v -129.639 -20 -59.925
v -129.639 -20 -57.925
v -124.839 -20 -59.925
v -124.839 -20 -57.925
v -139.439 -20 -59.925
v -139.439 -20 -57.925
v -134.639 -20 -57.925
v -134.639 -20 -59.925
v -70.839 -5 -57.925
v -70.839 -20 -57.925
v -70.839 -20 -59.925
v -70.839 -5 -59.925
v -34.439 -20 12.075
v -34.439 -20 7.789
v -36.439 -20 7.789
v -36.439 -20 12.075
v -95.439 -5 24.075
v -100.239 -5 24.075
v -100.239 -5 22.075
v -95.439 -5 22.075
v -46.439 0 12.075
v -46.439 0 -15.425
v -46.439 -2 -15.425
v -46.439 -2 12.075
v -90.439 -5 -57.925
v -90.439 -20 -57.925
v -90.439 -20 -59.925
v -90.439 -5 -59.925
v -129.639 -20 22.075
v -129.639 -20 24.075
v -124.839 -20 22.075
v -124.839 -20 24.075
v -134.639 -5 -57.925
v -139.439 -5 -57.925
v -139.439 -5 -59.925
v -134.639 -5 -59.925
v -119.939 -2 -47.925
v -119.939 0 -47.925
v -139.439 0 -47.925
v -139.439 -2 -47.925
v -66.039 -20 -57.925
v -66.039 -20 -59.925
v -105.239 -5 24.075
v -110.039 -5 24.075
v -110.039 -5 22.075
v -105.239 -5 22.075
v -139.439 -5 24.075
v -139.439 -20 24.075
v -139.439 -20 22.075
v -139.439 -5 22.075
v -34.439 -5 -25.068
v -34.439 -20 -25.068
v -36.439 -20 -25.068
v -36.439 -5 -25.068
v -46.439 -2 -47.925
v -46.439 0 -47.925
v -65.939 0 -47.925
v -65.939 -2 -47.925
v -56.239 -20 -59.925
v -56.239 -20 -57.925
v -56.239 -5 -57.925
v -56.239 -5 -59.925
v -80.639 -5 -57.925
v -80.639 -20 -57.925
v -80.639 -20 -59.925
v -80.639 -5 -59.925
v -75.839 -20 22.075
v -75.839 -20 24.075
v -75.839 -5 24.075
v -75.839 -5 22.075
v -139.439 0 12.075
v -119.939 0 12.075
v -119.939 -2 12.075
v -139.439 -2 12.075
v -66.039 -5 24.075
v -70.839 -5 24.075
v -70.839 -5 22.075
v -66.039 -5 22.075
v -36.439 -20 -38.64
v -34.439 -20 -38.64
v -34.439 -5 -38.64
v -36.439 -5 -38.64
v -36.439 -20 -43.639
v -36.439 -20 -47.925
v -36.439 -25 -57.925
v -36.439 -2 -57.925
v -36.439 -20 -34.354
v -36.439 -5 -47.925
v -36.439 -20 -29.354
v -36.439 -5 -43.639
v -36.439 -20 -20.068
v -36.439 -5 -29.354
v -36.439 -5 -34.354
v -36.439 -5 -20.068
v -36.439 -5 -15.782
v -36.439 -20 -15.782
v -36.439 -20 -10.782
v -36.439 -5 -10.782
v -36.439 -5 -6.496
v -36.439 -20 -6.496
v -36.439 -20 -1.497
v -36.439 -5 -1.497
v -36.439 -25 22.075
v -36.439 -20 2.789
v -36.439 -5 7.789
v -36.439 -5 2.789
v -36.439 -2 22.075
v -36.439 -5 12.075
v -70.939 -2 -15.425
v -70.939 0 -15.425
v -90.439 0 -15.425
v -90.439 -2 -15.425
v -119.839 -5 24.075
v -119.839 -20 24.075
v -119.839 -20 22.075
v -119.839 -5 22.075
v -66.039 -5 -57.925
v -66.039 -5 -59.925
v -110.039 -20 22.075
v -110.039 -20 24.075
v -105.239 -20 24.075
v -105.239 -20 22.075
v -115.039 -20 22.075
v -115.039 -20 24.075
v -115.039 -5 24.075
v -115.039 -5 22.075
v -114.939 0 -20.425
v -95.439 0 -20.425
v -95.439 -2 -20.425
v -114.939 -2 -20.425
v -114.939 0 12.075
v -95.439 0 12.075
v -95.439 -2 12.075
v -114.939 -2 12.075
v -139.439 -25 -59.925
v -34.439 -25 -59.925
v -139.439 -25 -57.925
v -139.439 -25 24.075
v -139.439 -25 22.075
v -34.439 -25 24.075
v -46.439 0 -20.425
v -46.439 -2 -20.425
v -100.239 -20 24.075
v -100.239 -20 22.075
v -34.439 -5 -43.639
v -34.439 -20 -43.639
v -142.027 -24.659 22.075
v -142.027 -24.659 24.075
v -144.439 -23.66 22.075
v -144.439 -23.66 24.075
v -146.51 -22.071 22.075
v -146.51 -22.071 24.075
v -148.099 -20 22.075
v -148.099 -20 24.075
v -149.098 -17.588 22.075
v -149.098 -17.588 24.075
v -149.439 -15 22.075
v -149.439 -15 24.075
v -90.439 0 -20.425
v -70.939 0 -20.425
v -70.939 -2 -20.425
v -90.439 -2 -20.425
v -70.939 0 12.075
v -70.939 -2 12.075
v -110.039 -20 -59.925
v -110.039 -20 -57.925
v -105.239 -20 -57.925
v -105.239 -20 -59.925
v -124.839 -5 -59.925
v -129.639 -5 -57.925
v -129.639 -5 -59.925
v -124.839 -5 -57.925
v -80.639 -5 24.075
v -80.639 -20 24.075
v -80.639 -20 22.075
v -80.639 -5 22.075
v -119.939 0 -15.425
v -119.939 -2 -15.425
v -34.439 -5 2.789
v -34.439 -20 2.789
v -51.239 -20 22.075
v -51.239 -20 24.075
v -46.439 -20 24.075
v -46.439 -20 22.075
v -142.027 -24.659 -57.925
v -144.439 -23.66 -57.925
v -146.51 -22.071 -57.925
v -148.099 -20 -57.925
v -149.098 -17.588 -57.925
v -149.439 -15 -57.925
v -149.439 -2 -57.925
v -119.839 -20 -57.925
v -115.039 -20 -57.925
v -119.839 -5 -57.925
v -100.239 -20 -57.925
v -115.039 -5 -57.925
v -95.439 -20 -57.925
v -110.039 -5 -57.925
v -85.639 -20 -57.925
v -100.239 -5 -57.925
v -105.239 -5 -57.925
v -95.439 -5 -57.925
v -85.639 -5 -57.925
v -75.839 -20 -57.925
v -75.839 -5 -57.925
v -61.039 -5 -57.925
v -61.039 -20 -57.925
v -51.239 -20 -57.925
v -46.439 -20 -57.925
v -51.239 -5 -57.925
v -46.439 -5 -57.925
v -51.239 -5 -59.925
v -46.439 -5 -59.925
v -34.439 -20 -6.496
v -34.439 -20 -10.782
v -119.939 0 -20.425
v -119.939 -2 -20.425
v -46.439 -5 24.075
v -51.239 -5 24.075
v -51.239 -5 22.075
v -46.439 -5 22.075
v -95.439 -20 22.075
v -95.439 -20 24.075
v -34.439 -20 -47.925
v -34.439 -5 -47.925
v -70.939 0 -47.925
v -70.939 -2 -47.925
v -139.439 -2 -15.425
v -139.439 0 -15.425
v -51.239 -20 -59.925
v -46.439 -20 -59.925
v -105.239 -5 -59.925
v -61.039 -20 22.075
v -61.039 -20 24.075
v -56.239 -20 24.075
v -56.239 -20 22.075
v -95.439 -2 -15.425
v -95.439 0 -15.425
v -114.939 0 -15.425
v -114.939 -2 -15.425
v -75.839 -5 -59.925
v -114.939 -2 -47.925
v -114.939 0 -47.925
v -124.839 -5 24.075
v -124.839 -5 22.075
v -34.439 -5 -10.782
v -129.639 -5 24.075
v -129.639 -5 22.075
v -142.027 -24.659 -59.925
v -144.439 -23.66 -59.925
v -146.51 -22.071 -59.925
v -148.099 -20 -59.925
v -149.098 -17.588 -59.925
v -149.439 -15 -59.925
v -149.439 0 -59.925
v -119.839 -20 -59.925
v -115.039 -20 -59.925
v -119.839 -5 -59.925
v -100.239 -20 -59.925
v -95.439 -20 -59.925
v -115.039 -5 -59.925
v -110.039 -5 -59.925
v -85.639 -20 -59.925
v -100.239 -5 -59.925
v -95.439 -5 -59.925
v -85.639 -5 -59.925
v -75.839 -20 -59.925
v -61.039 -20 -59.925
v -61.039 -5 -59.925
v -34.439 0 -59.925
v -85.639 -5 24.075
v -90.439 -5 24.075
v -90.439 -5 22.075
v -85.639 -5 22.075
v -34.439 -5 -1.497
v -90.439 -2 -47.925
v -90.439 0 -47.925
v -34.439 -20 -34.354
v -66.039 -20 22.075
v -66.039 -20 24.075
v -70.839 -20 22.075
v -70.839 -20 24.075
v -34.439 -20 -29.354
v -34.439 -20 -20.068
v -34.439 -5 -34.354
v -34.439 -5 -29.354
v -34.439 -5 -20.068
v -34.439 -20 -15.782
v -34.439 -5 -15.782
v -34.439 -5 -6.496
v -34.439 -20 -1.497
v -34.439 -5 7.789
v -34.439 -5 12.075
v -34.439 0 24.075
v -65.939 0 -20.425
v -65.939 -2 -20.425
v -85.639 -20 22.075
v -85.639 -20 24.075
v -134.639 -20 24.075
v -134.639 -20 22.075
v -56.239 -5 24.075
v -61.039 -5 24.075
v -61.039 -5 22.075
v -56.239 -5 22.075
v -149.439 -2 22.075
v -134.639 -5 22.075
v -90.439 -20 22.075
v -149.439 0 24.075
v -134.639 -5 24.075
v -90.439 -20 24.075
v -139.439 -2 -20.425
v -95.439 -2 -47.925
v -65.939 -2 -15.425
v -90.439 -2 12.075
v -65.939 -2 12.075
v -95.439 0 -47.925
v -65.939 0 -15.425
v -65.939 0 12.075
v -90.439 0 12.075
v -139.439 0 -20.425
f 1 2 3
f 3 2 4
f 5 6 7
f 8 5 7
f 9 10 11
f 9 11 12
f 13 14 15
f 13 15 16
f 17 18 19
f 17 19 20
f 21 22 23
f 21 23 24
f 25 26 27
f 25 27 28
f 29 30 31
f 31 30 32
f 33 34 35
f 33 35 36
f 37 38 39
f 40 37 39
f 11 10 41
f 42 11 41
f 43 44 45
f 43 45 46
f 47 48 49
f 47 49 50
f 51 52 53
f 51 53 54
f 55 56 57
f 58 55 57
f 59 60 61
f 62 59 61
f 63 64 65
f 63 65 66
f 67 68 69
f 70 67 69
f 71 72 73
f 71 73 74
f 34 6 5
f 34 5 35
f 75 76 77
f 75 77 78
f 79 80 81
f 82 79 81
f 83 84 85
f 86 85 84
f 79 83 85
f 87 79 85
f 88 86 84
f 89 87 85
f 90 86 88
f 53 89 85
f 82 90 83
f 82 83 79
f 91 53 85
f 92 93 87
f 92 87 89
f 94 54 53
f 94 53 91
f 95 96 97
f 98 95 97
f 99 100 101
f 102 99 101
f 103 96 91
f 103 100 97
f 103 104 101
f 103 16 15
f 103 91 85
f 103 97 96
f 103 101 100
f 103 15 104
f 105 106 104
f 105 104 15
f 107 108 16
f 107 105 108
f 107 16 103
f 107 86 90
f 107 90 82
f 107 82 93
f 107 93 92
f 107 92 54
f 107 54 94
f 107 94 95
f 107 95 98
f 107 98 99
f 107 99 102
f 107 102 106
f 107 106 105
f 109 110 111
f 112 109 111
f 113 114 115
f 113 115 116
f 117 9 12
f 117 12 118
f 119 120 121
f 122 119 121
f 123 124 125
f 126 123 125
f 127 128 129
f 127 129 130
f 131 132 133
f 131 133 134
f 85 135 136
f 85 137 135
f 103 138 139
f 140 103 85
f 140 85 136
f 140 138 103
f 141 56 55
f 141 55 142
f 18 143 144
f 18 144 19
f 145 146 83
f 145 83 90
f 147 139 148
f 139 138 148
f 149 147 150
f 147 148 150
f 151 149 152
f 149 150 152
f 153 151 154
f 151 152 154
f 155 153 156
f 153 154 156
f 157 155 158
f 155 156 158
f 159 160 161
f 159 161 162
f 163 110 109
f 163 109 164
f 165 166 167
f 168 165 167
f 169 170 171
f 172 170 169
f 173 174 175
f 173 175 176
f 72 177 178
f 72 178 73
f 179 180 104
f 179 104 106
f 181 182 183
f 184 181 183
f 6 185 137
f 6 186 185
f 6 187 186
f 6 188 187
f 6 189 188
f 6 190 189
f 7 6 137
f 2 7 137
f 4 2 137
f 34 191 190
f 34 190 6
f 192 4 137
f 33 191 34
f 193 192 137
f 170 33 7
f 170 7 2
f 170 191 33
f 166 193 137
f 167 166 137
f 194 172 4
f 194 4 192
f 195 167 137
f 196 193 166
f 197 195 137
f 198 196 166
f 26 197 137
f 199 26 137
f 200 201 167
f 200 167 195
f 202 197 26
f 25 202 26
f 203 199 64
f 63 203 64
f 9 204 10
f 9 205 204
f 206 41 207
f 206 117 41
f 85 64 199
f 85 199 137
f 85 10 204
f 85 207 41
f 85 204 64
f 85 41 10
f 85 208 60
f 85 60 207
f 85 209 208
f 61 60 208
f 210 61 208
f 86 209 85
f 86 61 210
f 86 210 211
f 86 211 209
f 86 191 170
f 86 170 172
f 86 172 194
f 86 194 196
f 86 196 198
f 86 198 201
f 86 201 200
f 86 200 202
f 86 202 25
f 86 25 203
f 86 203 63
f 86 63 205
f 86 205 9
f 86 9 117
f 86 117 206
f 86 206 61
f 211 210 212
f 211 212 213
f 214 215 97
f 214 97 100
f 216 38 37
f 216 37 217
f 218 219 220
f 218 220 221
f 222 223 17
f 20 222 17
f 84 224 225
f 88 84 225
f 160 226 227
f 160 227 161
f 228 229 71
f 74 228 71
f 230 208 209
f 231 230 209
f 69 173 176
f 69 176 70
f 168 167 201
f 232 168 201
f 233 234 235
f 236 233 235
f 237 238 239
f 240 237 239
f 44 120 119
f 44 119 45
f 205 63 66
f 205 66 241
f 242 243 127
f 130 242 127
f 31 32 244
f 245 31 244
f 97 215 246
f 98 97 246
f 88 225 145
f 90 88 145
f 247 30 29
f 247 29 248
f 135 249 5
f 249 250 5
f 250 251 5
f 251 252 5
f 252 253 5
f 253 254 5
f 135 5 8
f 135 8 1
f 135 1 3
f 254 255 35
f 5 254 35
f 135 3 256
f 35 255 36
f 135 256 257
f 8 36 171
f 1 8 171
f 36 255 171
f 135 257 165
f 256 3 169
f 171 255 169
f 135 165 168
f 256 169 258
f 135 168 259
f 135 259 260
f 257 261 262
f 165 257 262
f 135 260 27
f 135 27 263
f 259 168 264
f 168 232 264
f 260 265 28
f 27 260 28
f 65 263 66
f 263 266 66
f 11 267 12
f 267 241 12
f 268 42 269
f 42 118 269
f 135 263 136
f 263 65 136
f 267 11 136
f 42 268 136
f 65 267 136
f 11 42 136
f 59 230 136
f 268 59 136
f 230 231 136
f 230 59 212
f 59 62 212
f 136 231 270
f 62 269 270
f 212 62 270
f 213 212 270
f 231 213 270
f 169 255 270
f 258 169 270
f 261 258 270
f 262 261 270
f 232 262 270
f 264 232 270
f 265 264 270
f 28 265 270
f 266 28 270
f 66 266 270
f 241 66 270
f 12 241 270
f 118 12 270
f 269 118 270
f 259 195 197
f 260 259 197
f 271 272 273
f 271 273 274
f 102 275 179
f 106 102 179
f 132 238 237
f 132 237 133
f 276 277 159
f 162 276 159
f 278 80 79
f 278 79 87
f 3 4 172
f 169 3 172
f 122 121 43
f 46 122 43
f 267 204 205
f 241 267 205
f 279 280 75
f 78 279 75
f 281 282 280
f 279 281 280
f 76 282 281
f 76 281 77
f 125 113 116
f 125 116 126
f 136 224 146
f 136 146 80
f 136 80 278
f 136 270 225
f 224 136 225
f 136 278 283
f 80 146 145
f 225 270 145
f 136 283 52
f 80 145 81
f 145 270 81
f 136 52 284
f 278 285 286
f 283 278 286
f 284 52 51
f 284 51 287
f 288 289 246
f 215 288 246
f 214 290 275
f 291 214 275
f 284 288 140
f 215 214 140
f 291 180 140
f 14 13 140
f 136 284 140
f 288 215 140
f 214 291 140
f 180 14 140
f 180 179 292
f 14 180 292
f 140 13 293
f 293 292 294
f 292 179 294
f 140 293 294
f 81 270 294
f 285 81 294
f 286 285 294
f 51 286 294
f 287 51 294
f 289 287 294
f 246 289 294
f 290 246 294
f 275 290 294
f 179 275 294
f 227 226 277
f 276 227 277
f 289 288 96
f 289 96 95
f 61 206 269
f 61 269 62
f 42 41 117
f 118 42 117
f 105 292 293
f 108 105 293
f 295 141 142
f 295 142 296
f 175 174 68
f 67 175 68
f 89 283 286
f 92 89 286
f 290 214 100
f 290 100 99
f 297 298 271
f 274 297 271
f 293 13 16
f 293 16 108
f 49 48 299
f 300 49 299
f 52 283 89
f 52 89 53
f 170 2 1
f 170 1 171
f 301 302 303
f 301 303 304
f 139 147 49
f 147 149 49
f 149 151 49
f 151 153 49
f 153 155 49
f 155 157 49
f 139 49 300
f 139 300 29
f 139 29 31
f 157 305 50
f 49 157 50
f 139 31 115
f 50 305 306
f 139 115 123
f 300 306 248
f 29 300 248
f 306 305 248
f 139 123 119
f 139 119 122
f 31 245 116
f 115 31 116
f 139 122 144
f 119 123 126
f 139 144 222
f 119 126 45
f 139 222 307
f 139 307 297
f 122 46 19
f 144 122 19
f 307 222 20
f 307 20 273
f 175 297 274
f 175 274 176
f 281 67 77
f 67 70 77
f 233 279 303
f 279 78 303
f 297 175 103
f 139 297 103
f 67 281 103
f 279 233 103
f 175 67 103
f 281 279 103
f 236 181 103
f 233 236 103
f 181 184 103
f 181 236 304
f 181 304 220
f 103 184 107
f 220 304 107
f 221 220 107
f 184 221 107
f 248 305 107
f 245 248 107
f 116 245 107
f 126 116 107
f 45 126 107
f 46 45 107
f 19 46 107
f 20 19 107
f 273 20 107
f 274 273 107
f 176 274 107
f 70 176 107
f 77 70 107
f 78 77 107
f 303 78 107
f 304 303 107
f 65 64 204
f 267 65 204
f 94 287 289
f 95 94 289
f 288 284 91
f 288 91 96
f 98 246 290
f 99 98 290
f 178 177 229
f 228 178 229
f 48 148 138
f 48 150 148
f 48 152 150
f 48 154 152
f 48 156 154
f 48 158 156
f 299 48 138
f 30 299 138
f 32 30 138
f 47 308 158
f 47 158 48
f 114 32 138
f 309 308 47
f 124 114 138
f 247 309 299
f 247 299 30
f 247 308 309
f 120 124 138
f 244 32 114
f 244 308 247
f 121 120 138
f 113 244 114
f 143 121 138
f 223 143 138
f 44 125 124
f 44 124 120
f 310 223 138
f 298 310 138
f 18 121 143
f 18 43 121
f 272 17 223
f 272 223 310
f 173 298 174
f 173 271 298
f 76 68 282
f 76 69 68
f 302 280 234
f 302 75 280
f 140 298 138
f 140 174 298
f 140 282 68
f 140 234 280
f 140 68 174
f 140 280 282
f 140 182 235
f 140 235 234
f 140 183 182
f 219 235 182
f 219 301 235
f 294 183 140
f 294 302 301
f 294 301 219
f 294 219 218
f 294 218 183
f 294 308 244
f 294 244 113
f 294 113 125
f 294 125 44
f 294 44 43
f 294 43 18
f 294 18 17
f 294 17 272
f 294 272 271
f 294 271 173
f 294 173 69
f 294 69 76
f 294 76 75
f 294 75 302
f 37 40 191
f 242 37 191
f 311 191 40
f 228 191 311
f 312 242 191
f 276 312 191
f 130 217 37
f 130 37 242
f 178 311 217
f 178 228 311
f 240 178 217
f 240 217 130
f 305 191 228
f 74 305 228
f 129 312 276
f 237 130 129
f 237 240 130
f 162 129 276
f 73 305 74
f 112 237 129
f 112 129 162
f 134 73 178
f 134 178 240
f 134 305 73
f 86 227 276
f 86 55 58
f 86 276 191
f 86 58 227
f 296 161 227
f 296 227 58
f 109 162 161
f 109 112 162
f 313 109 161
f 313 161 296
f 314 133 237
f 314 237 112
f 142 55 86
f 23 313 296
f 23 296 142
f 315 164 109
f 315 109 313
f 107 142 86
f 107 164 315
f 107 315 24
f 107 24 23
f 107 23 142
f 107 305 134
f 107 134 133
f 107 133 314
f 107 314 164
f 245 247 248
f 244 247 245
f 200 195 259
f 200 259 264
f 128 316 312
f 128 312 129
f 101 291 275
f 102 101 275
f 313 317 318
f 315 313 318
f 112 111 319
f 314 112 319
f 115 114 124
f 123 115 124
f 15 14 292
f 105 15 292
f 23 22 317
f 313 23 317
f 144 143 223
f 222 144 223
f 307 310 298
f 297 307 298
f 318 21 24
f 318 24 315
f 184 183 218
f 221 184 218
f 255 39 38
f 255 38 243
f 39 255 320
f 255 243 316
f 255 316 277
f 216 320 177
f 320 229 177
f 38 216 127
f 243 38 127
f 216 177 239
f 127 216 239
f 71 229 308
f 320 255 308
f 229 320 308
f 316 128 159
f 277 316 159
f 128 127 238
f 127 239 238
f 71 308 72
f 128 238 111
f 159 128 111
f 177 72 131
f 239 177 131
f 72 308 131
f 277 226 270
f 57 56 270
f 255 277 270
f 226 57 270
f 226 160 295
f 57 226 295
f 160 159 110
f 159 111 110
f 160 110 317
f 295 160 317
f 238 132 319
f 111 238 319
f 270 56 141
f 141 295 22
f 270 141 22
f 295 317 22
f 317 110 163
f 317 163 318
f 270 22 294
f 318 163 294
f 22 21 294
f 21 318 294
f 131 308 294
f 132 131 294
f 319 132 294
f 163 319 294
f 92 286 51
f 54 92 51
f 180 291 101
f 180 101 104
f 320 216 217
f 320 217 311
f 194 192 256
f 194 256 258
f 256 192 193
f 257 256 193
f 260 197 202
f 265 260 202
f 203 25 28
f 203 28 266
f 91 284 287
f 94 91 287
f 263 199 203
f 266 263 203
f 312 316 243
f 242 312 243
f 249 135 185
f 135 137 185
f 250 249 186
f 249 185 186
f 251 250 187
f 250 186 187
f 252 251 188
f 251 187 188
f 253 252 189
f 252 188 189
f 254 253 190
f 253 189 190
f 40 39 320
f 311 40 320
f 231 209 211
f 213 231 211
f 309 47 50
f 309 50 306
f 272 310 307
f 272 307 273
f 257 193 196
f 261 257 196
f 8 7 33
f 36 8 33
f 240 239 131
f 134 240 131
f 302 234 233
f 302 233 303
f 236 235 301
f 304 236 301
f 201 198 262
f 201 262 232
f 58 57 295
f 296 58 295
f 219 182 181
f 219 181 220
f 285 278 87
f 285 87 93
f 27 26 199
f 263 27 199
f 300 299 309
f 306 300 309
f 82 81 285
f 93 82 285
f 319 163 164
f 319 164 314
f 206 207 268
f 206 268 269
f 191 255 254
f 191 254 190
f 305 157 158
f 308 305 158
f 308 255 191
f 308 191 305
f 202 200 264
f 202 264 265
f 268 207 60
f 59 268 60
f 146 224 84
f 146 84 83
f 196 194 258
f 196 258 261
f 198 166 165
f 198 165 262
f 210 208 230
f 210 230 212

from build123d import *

# Parameters (mm, degrees)
F0_W     = 115
F0_H     = 84
F1_DEPTH = 25
F2_T     = -2
F3_R     = 10
F4_W     = 19.5
F4_H     = 27.5
F5_DEPTH = 25
F6_W     = 4.8
F6_H     = 15
F7_DEPTH = 84.001
F8_W     = 15
F8_H     = 4.286
F9_DEPTH = 25


with BuildPart() as f1:
    # F0 (on Front) → F1 (new body)
    with BuildSketch(Plane.XZ):
        with Locations((-91.9387002908, -17.9252284579)):
            Rectangle(F0_W, F0_H)
    extrude(amount=F1_DEPTH)

    # F2
    f2_openings = [f1.faces().sort_by_distance(p)[0] for p in [
        (-91.9387, -25, -17.925228),
        (-149.4387, -12.5, -17.925228),
    ]]
    offset(amount=F2_T, openings=f2_openings)

    # F3
    f3_edges = [f1.edges().sort_by_distance(p)[0] for p in [
        (-149.4387, -25, 23.074772),
        (-149.4387, -25, -58.925228),
    ]]
    fillet(f3_edges, radius=F3_R)

    # F4 (on face) → F5 (cut)
    with BuildSketch(Plane(origin=(0, 0, 0), x_dir=(-1, 0, 0), z_dir=(0, 1, 0))):
        with Locations((56.1887002908, -1.6752284579)):
            Rectangle(F4_W, F4_H)
        with Locations((80.6887002908, -1.6752284579)):
            Rectangle(F4_W, F4_H)
        with Locations((105.1887002908, -1.6752284579)):
            Rectangle(F4_W, F4_H)
        with Locations((129.6887002908, -1.6752284579)):
            Rectangle(F4_W, F4_H)
        with Locations((129.6887002908, -34.1752284579)):
            Rectangle(F4_W, F4_H)
        with Locations((105.1887002908, -34.1752284579)):
            Rectangle(F4_W, F4_H)
        with Locations((80.6887002908, -34.1752284579)):
            Rectangle(F4_W, F4_H)
        with Locations((56.1887002908, -34.1752284579)):
            Rectangle(F4_W, F4_H)
    extrude(amount=-F5_DEPTH, mode=Mode.SUBTRACT)

    # F6 (on face) → F7 (cut, through all)
    with BuildSketch(Plane.XY.offset(24.0747715421)):
        with Locations((-48.8387002908, -12.5)):
            Rectangle(F6_W, F6_H)
        with Locations((-58.6387002908, -12.5)):
            Rectangle(F6_W, F6_H)
        with Locations((-68.4387002908, -12.5)):
            Rectangle(F6_W, F6_H)
        with Locations((-78.2387002908, -12.5)):
            Rectangle(F6_W, F6_H)
        with Locations((-88.0387002908, -12.5)):
            Rectangle(F6_W, F6_H)
        with Locations((-97.8387002908, -12.5)):
            Rectangle(F6_W, F6_H)
        with Locations((-107.6387002908, -12.5)):
            Rectangle(F6_W, F6_H)
        with Locations((-117.4387002908, -12.5)):
            Rectangle(F6_W, F6_H)
        with Locations((-127.2387002908, -12.5)):
            Rectangle(F6_W, F6_H)
        with Locations((-137.0387002908, -12.5)):
            Rectangle(F6_W, F6_H)
    extrude(amount=-F7_DEPTH, mode=Mode.SUBTRACT)

    # F8 (on face) → F9 (cut)
    with BuildSketch(Plane.YZ.offset(-34.4387002908)):
        with Locations((-12.5, -45.7822284579)):
            Rectangle(F8_W, F8_H)
        with Locations((-12.5, -36.4965141579)):
            Rectangle(F8_W, F8_H)
        with Locations((-12.5, -27.2107998579)):
            Rectangle(F8_W, F8_H)
        with Locations((-12.5, -17.9250855579)):
            Rectangle(F8_W, F8_H)
        with Locations((-12.5, -8.6393712579)):
            Rectangle(F8_W, F8_H)
        with Locations((-12.5, 0.6463430421)):
            Rectangle(F8_W, F8_H)
        with Locations((-12.5, 9.9320573421)):
            Rectangle(F8_W, F8_H)
    extrude(amount=-F9_DEPTH, mode=Mode.SUBTRACT)


solid = f1.part
